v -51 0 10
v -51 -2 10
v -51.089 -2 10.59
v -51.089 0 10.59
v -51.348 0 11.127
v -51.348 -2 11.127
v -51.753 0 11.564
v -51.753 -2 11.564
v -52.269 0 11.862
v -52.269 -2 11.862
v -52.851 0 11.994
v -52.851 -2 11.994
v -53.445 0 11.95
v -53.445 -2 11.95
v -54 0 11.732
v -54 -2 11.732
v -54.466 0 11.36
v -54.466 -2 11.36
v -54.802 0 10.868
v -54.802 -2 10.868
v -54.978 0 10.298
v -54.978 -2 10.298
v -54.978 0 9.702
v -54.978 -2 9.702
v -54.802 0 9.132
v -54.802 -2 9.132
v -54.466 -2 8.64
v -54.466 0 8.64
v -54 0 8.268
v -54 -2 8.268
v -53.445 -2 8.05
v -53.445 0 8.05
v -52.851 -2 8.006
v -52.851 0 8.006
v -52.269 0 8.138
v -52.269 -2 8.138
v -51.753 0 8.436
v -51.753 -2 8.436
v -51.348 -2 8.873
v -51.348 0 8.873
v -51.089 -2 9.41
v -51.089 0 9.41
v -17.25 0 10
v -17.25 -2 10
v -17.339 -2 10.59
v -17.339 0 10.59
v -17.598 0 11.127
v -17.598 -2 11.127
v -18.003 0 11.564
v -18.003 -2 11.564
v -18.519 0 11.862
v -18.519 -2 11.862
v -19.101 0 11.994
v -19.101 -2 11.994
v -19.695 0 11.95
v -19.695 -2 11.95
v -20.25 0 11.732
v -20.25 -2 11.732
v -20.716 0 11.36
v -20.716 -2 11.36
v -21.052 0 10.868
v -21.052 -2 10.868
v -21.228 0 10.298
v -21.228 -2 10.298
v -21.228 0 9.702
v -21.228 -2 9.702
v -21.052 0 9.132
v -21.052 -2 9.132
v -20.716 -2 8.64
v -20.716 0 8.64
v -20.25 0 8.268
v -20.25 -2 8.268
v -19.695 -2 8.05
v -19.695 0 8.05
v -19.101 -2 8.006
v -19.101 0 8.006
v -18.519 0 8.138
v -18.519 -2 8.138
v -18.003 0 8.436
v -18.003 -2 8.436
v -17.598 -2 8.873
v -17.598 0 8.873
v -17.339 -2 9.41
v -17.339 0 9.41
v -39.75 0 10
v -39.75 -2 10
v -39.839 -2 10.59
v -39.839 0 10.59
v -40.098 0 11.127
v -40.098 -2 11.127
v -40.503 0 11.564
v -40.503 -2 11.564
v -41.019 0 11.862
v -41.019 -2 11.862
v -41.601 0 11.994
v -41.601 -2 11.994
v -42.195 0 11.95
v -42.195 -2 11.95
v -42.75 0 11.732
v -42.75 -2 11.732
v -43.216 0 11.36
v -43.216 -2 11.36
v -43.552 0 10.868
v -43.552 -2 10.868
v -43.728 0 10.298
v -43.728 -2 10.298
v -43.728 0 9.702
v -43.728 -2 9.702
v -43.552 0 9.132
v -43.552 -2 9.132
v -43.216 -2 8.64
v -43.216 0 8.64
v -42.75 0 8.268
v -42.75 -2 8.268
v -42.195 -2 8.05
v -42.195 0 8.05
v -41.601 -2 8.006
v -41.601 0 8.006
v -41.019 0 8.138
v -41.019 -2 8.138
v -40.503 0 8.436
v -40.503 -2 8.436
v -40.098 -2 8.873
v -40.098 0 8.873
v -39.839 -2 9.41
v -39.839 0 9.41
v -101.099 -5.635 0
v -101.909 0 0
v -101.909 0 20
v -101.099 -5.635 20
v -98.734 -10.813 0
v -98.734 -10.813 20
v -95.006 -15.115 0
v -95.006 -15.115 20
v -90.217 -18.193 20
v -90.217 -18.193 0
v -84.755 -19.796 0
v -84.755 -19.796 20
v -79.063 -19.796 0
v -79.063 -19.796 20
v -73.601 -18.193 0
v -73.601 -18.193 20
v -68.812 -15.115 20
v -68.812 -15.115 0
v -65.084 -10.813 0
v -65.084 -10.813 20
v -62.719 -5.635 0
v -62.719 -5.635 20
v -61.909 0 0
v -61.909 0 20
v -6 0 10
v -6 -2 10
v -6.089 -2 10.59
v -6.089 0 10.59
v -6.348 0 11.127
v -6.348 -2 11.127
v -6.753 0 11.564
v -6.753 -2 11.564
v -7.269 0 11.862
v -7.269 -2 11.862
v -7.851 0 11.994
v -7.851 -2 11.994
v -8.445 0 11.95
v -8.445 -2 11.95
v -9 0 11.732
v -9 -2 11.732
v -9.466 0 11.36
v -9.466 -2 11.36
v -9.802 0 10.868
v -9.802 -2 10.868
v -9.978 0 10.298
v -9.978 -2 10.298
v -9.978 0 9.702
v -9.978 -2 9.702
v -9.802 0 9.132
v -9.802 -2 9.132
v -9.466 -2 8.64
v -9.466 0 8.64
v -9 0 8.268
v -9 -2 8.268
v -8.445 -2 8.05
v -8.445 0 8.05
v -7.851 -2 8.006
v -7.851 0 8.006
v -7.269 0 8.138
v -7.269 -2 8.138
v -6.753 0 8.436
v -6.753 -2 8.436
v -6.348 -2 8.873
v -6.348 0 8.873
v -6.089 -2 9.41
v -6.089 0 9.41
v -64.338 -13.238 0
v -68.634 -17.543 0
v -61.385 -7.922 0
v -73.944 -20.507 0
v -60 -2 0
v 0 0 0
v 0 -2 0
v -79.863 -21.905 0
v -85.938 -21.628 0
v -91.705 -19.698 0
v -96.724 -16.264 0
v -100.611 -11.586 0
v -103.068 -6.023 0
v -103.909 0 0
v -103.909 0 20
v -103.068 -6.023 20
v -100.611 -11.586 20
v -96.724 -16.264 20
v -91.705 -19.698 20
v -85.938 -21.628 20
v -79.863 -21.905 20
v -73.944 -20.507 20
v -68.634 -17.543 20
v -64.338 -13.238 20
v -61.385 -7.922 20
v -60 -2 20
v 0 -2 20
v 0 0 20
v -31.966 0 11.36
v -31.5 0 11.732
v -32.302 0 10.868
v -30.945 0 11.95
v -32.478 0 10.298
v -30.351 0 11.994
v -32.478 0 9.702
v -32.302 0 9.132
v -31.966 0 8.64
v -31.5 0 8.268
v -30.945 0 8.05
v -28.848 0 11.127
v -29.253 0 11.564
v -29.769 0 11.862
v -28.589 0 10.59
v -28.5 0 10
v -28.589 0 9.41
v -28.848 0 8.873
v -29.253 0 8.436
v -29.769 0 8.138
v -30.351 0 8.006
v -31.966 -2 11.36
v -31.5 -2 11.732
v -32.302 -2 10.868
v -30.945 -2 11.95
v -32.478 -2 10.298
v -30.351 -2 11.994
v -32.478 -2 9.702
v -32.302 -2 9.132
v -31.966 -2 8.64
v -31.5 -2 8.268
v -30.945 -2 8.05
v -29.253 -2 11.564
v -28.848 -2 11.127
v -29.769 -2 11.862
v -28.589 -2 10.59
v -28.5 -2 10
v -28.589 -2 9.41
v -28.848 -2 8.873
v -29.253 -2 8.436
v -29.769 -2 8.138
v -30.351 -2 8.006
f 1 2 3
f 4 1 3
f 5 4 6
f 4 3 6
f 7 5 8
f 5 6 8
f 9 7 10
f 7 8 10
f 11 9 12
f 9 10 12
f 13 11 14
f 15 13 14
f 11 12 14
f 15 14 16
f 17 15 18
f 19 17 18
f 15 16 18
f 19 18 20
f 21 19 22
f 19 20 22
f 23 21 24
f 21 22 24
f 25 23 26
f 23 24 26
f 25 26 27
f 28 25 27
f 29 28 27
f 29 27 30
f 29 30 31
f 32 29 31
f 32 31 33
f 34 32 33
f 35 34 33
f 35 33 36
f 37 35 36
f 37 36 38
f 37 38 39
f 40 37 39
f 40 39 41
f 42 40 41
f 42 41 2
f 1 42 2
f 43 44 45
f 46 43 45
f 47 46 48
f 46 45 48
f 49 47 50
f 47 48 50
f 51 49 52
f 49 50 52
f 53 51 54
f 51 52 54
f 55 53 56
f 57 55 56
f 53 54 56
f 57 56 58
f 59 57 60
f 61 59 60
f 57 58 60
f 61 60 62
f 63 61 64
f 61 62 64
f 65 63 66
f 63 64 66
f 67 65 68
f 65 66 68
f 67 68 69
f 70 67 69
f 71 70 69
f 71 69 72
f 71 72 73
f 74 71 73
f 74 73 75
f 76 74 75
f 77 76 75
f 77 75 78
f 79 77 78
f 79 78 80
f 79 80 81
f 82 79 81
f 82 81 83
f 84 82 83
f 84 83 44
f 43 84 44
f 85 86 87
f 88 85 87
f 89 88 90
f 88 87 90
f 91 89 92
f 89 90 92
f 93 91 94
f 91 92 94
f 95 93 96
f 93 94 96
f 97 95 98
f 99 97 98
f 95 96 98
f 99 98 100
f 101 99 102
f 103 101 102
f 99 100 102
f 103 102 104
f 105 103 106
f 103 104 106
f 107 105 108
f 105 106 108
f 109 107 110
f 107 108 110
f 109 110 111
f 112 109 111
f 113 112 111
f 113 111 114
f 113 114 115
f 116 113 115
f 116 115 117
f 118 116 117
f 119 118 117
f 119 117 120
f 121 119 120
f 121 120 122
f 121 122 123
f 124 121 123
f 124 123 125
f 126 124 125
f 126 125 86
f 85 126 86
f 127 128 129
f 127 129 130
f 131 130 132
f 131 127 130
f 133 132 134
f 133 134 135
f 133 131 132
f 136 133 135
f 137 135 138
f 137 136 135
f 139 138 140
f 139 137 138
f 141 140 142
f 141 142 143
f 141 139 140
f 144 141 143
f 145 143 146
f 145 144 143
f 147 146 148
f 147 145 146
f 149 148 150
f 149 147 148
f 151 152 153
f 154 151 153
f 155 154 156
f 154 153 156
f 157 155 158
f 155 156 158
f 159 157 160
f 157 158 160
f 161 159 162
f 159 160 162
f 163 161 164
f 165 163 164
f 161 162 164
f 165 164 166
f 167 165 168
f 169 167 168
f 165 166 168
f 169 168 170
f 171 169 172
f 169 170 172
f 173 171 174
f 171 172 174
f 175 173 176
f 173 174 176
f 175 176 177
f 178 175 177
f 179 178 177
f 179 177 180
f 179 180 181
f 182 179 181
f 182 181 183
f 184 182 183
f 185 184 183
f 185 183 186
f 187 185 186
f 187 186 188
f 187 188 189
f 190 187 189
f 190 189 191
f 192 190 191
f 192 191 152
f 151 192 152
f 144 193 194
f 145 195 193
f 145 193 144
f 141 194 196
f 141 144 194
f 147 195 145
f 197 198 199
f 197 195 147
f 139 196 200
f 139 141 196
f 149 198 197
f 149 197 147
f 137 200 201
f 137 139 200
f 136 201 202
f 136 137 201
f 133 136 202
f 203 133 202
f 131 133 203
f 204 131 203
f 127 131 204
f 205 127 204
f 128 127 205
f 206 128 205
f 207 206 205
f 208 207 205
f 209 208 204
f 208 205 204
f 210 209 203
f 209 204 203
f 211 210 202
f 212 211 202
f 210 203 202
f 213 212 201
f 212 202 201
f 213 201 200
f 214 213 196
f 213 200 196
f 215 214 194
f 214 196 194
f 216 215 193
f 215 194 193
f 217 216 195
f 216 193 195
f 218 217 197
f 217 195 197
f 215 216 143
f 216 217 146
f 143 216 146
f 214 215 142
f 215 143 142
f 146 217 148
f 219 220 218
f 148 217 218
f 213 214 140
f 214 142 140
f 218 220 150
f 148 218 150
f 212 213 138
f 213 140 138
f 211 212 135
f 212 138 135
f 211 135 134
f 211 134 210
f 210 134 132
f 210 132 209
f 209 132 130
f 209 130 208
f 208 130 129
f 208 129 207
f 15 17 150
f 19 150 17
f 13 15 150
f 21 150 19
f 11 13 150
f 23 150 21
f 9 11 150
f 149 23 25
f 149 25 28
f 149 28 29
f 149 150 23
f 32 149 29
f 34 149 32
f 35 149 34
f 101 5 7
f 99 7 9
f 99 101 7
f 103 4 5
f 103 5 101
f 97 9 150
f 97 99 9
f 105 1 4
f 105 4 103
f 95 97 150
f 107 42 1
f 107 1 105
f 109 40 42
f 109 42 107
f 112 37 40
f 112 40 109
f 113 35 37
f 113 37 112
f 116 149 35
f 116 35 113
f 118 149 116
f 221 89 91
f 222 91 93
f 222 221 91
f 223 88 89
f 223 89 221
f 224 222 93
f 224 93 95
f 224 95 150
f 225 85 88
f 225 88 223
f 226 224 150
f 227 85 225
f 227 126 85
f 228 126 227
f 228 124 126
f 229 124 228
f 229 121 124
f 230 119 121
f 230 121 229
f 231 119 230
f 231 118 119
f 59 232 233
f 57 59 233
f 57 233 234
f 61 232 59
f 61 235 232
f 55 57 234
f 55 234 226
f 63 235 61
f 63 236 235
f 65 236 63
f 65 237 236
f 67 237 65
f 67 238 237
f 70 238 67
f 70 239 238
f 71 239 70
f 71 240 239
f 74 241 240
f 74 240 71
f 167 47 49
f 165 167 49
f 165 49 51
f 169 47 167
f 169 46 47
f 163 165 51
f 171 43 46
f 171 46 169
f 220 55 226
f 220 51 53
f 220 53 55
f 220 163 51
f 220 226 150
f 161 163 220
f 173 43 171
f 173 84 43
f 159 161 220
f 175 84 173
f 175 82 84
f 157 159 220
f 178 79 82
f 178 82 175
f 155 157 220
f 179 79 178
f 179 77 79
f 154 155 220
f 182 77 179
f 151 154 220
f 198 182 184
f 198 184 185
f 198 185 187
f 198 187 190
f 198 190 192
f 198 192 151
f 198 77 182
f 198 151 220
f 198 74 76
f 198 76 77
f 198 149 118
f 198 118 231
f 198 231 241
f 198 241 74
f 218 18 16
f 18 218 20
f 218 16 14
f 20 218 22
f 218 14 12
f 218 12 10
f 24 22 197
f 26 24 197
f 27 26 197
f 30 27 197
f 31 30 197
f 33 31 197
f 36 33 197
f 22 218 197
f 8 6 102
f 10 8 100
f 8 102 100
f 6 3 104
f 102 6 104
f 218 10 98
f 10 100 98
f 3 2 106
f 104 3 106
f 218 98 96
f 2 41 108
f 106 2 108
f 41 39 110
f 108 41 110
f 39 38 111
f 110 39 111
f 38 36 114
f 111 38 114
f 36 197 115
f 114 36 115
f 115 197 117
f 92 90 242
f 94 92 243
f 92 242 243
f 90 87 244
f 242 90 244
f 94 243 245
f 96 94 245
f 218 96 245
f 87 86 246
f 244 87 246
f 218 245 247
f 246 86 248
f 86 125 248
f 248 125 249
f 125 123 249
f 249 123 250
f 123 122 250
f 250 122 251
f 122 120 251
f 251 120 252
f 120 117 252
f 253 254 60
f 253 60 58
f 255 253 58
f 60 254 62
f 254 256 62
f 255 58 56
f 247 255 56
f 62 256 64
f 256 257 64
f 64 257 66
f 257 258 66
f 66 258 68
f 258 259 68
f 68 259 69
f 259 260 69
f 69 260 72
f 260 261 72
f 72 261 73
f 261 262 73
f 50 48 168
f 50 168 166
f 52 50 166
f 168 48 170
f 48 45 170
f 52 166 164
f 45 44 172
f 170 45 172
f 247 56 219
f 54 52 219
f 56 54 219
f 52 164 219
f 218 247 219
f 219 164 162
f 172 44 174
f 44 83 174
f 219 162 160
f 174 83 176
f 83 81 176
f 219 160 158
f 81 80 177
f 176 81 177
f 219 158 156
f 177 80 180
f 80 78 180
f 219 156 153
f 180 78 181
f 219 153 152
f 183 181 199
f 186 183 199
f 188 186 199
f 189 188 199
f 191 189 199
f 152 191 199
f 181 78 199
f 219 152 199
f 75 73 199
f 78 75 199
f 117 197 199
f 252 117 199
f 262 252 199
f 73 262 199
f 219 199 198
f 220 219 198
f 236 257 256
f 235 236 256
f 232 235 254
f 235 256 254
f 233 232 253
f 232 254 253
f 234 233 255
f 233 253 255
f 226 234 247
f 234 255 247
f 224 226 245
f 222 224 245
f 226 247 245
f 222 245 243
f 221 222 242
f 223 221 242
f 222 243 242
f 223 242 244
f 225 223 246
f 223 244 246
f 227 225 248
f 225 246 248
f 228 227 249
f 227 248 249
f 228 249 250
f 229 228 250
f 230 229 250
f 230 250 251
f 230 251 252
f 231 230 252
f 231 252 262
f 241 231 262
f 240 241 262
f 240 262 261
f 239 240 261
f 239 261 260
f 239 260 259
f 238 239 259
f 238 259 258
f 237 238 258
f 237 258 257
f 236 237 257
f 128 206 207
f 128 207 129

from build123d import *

# Parameters (mm, degrees)
PAD_DEPTH           = 20
SKETCH001_R         = 2
POCKET_DEPTH        = 2.001
LINEARPATTERN_COUNT = 5
LINEARPATTERN_PITCH = 11.25


with BuildPart() as part:
    # Sketch → Pad (new body)
    with BuildSketch(Plane.XY):
        with BuildLine():
            ThreePointArc((-101.908902, 0), (-81.908902, -20), (-61.908902, 0))
            Line((-61.908902, 0), (0, 0))
            Line((0, -2), (0, 0))
            Line((-60, -2), (0, -2))
            ThreePointArc((-103.908902, 0), (-82.909939, -21.977214), (-60, -2))
            Line((-103.908902, 0), (-101.908902, 0))
        make_face()
    extrude(amount=PAD_DEPTH)

    # Sketch001 → Pocket (cut, through all)
    with BuildSketch(Plane.XZ.offset(2)):
        with Locations((-53, 10)):
            Circle(SKETCH001_R)
    pocket = extrude(amount=-POCKET_DEPTH, mode=Mode.SUBTRACT)

    # LinearPattern: Pocket ×5
    with Locations(*[(i * LINEARPATTERN_PITCH, 0, 0) for i in range(1, LINEARPATTERN_COUNT)]):
        add(pocket, mode=Mode.SUBTRACT)


solid = part.part
